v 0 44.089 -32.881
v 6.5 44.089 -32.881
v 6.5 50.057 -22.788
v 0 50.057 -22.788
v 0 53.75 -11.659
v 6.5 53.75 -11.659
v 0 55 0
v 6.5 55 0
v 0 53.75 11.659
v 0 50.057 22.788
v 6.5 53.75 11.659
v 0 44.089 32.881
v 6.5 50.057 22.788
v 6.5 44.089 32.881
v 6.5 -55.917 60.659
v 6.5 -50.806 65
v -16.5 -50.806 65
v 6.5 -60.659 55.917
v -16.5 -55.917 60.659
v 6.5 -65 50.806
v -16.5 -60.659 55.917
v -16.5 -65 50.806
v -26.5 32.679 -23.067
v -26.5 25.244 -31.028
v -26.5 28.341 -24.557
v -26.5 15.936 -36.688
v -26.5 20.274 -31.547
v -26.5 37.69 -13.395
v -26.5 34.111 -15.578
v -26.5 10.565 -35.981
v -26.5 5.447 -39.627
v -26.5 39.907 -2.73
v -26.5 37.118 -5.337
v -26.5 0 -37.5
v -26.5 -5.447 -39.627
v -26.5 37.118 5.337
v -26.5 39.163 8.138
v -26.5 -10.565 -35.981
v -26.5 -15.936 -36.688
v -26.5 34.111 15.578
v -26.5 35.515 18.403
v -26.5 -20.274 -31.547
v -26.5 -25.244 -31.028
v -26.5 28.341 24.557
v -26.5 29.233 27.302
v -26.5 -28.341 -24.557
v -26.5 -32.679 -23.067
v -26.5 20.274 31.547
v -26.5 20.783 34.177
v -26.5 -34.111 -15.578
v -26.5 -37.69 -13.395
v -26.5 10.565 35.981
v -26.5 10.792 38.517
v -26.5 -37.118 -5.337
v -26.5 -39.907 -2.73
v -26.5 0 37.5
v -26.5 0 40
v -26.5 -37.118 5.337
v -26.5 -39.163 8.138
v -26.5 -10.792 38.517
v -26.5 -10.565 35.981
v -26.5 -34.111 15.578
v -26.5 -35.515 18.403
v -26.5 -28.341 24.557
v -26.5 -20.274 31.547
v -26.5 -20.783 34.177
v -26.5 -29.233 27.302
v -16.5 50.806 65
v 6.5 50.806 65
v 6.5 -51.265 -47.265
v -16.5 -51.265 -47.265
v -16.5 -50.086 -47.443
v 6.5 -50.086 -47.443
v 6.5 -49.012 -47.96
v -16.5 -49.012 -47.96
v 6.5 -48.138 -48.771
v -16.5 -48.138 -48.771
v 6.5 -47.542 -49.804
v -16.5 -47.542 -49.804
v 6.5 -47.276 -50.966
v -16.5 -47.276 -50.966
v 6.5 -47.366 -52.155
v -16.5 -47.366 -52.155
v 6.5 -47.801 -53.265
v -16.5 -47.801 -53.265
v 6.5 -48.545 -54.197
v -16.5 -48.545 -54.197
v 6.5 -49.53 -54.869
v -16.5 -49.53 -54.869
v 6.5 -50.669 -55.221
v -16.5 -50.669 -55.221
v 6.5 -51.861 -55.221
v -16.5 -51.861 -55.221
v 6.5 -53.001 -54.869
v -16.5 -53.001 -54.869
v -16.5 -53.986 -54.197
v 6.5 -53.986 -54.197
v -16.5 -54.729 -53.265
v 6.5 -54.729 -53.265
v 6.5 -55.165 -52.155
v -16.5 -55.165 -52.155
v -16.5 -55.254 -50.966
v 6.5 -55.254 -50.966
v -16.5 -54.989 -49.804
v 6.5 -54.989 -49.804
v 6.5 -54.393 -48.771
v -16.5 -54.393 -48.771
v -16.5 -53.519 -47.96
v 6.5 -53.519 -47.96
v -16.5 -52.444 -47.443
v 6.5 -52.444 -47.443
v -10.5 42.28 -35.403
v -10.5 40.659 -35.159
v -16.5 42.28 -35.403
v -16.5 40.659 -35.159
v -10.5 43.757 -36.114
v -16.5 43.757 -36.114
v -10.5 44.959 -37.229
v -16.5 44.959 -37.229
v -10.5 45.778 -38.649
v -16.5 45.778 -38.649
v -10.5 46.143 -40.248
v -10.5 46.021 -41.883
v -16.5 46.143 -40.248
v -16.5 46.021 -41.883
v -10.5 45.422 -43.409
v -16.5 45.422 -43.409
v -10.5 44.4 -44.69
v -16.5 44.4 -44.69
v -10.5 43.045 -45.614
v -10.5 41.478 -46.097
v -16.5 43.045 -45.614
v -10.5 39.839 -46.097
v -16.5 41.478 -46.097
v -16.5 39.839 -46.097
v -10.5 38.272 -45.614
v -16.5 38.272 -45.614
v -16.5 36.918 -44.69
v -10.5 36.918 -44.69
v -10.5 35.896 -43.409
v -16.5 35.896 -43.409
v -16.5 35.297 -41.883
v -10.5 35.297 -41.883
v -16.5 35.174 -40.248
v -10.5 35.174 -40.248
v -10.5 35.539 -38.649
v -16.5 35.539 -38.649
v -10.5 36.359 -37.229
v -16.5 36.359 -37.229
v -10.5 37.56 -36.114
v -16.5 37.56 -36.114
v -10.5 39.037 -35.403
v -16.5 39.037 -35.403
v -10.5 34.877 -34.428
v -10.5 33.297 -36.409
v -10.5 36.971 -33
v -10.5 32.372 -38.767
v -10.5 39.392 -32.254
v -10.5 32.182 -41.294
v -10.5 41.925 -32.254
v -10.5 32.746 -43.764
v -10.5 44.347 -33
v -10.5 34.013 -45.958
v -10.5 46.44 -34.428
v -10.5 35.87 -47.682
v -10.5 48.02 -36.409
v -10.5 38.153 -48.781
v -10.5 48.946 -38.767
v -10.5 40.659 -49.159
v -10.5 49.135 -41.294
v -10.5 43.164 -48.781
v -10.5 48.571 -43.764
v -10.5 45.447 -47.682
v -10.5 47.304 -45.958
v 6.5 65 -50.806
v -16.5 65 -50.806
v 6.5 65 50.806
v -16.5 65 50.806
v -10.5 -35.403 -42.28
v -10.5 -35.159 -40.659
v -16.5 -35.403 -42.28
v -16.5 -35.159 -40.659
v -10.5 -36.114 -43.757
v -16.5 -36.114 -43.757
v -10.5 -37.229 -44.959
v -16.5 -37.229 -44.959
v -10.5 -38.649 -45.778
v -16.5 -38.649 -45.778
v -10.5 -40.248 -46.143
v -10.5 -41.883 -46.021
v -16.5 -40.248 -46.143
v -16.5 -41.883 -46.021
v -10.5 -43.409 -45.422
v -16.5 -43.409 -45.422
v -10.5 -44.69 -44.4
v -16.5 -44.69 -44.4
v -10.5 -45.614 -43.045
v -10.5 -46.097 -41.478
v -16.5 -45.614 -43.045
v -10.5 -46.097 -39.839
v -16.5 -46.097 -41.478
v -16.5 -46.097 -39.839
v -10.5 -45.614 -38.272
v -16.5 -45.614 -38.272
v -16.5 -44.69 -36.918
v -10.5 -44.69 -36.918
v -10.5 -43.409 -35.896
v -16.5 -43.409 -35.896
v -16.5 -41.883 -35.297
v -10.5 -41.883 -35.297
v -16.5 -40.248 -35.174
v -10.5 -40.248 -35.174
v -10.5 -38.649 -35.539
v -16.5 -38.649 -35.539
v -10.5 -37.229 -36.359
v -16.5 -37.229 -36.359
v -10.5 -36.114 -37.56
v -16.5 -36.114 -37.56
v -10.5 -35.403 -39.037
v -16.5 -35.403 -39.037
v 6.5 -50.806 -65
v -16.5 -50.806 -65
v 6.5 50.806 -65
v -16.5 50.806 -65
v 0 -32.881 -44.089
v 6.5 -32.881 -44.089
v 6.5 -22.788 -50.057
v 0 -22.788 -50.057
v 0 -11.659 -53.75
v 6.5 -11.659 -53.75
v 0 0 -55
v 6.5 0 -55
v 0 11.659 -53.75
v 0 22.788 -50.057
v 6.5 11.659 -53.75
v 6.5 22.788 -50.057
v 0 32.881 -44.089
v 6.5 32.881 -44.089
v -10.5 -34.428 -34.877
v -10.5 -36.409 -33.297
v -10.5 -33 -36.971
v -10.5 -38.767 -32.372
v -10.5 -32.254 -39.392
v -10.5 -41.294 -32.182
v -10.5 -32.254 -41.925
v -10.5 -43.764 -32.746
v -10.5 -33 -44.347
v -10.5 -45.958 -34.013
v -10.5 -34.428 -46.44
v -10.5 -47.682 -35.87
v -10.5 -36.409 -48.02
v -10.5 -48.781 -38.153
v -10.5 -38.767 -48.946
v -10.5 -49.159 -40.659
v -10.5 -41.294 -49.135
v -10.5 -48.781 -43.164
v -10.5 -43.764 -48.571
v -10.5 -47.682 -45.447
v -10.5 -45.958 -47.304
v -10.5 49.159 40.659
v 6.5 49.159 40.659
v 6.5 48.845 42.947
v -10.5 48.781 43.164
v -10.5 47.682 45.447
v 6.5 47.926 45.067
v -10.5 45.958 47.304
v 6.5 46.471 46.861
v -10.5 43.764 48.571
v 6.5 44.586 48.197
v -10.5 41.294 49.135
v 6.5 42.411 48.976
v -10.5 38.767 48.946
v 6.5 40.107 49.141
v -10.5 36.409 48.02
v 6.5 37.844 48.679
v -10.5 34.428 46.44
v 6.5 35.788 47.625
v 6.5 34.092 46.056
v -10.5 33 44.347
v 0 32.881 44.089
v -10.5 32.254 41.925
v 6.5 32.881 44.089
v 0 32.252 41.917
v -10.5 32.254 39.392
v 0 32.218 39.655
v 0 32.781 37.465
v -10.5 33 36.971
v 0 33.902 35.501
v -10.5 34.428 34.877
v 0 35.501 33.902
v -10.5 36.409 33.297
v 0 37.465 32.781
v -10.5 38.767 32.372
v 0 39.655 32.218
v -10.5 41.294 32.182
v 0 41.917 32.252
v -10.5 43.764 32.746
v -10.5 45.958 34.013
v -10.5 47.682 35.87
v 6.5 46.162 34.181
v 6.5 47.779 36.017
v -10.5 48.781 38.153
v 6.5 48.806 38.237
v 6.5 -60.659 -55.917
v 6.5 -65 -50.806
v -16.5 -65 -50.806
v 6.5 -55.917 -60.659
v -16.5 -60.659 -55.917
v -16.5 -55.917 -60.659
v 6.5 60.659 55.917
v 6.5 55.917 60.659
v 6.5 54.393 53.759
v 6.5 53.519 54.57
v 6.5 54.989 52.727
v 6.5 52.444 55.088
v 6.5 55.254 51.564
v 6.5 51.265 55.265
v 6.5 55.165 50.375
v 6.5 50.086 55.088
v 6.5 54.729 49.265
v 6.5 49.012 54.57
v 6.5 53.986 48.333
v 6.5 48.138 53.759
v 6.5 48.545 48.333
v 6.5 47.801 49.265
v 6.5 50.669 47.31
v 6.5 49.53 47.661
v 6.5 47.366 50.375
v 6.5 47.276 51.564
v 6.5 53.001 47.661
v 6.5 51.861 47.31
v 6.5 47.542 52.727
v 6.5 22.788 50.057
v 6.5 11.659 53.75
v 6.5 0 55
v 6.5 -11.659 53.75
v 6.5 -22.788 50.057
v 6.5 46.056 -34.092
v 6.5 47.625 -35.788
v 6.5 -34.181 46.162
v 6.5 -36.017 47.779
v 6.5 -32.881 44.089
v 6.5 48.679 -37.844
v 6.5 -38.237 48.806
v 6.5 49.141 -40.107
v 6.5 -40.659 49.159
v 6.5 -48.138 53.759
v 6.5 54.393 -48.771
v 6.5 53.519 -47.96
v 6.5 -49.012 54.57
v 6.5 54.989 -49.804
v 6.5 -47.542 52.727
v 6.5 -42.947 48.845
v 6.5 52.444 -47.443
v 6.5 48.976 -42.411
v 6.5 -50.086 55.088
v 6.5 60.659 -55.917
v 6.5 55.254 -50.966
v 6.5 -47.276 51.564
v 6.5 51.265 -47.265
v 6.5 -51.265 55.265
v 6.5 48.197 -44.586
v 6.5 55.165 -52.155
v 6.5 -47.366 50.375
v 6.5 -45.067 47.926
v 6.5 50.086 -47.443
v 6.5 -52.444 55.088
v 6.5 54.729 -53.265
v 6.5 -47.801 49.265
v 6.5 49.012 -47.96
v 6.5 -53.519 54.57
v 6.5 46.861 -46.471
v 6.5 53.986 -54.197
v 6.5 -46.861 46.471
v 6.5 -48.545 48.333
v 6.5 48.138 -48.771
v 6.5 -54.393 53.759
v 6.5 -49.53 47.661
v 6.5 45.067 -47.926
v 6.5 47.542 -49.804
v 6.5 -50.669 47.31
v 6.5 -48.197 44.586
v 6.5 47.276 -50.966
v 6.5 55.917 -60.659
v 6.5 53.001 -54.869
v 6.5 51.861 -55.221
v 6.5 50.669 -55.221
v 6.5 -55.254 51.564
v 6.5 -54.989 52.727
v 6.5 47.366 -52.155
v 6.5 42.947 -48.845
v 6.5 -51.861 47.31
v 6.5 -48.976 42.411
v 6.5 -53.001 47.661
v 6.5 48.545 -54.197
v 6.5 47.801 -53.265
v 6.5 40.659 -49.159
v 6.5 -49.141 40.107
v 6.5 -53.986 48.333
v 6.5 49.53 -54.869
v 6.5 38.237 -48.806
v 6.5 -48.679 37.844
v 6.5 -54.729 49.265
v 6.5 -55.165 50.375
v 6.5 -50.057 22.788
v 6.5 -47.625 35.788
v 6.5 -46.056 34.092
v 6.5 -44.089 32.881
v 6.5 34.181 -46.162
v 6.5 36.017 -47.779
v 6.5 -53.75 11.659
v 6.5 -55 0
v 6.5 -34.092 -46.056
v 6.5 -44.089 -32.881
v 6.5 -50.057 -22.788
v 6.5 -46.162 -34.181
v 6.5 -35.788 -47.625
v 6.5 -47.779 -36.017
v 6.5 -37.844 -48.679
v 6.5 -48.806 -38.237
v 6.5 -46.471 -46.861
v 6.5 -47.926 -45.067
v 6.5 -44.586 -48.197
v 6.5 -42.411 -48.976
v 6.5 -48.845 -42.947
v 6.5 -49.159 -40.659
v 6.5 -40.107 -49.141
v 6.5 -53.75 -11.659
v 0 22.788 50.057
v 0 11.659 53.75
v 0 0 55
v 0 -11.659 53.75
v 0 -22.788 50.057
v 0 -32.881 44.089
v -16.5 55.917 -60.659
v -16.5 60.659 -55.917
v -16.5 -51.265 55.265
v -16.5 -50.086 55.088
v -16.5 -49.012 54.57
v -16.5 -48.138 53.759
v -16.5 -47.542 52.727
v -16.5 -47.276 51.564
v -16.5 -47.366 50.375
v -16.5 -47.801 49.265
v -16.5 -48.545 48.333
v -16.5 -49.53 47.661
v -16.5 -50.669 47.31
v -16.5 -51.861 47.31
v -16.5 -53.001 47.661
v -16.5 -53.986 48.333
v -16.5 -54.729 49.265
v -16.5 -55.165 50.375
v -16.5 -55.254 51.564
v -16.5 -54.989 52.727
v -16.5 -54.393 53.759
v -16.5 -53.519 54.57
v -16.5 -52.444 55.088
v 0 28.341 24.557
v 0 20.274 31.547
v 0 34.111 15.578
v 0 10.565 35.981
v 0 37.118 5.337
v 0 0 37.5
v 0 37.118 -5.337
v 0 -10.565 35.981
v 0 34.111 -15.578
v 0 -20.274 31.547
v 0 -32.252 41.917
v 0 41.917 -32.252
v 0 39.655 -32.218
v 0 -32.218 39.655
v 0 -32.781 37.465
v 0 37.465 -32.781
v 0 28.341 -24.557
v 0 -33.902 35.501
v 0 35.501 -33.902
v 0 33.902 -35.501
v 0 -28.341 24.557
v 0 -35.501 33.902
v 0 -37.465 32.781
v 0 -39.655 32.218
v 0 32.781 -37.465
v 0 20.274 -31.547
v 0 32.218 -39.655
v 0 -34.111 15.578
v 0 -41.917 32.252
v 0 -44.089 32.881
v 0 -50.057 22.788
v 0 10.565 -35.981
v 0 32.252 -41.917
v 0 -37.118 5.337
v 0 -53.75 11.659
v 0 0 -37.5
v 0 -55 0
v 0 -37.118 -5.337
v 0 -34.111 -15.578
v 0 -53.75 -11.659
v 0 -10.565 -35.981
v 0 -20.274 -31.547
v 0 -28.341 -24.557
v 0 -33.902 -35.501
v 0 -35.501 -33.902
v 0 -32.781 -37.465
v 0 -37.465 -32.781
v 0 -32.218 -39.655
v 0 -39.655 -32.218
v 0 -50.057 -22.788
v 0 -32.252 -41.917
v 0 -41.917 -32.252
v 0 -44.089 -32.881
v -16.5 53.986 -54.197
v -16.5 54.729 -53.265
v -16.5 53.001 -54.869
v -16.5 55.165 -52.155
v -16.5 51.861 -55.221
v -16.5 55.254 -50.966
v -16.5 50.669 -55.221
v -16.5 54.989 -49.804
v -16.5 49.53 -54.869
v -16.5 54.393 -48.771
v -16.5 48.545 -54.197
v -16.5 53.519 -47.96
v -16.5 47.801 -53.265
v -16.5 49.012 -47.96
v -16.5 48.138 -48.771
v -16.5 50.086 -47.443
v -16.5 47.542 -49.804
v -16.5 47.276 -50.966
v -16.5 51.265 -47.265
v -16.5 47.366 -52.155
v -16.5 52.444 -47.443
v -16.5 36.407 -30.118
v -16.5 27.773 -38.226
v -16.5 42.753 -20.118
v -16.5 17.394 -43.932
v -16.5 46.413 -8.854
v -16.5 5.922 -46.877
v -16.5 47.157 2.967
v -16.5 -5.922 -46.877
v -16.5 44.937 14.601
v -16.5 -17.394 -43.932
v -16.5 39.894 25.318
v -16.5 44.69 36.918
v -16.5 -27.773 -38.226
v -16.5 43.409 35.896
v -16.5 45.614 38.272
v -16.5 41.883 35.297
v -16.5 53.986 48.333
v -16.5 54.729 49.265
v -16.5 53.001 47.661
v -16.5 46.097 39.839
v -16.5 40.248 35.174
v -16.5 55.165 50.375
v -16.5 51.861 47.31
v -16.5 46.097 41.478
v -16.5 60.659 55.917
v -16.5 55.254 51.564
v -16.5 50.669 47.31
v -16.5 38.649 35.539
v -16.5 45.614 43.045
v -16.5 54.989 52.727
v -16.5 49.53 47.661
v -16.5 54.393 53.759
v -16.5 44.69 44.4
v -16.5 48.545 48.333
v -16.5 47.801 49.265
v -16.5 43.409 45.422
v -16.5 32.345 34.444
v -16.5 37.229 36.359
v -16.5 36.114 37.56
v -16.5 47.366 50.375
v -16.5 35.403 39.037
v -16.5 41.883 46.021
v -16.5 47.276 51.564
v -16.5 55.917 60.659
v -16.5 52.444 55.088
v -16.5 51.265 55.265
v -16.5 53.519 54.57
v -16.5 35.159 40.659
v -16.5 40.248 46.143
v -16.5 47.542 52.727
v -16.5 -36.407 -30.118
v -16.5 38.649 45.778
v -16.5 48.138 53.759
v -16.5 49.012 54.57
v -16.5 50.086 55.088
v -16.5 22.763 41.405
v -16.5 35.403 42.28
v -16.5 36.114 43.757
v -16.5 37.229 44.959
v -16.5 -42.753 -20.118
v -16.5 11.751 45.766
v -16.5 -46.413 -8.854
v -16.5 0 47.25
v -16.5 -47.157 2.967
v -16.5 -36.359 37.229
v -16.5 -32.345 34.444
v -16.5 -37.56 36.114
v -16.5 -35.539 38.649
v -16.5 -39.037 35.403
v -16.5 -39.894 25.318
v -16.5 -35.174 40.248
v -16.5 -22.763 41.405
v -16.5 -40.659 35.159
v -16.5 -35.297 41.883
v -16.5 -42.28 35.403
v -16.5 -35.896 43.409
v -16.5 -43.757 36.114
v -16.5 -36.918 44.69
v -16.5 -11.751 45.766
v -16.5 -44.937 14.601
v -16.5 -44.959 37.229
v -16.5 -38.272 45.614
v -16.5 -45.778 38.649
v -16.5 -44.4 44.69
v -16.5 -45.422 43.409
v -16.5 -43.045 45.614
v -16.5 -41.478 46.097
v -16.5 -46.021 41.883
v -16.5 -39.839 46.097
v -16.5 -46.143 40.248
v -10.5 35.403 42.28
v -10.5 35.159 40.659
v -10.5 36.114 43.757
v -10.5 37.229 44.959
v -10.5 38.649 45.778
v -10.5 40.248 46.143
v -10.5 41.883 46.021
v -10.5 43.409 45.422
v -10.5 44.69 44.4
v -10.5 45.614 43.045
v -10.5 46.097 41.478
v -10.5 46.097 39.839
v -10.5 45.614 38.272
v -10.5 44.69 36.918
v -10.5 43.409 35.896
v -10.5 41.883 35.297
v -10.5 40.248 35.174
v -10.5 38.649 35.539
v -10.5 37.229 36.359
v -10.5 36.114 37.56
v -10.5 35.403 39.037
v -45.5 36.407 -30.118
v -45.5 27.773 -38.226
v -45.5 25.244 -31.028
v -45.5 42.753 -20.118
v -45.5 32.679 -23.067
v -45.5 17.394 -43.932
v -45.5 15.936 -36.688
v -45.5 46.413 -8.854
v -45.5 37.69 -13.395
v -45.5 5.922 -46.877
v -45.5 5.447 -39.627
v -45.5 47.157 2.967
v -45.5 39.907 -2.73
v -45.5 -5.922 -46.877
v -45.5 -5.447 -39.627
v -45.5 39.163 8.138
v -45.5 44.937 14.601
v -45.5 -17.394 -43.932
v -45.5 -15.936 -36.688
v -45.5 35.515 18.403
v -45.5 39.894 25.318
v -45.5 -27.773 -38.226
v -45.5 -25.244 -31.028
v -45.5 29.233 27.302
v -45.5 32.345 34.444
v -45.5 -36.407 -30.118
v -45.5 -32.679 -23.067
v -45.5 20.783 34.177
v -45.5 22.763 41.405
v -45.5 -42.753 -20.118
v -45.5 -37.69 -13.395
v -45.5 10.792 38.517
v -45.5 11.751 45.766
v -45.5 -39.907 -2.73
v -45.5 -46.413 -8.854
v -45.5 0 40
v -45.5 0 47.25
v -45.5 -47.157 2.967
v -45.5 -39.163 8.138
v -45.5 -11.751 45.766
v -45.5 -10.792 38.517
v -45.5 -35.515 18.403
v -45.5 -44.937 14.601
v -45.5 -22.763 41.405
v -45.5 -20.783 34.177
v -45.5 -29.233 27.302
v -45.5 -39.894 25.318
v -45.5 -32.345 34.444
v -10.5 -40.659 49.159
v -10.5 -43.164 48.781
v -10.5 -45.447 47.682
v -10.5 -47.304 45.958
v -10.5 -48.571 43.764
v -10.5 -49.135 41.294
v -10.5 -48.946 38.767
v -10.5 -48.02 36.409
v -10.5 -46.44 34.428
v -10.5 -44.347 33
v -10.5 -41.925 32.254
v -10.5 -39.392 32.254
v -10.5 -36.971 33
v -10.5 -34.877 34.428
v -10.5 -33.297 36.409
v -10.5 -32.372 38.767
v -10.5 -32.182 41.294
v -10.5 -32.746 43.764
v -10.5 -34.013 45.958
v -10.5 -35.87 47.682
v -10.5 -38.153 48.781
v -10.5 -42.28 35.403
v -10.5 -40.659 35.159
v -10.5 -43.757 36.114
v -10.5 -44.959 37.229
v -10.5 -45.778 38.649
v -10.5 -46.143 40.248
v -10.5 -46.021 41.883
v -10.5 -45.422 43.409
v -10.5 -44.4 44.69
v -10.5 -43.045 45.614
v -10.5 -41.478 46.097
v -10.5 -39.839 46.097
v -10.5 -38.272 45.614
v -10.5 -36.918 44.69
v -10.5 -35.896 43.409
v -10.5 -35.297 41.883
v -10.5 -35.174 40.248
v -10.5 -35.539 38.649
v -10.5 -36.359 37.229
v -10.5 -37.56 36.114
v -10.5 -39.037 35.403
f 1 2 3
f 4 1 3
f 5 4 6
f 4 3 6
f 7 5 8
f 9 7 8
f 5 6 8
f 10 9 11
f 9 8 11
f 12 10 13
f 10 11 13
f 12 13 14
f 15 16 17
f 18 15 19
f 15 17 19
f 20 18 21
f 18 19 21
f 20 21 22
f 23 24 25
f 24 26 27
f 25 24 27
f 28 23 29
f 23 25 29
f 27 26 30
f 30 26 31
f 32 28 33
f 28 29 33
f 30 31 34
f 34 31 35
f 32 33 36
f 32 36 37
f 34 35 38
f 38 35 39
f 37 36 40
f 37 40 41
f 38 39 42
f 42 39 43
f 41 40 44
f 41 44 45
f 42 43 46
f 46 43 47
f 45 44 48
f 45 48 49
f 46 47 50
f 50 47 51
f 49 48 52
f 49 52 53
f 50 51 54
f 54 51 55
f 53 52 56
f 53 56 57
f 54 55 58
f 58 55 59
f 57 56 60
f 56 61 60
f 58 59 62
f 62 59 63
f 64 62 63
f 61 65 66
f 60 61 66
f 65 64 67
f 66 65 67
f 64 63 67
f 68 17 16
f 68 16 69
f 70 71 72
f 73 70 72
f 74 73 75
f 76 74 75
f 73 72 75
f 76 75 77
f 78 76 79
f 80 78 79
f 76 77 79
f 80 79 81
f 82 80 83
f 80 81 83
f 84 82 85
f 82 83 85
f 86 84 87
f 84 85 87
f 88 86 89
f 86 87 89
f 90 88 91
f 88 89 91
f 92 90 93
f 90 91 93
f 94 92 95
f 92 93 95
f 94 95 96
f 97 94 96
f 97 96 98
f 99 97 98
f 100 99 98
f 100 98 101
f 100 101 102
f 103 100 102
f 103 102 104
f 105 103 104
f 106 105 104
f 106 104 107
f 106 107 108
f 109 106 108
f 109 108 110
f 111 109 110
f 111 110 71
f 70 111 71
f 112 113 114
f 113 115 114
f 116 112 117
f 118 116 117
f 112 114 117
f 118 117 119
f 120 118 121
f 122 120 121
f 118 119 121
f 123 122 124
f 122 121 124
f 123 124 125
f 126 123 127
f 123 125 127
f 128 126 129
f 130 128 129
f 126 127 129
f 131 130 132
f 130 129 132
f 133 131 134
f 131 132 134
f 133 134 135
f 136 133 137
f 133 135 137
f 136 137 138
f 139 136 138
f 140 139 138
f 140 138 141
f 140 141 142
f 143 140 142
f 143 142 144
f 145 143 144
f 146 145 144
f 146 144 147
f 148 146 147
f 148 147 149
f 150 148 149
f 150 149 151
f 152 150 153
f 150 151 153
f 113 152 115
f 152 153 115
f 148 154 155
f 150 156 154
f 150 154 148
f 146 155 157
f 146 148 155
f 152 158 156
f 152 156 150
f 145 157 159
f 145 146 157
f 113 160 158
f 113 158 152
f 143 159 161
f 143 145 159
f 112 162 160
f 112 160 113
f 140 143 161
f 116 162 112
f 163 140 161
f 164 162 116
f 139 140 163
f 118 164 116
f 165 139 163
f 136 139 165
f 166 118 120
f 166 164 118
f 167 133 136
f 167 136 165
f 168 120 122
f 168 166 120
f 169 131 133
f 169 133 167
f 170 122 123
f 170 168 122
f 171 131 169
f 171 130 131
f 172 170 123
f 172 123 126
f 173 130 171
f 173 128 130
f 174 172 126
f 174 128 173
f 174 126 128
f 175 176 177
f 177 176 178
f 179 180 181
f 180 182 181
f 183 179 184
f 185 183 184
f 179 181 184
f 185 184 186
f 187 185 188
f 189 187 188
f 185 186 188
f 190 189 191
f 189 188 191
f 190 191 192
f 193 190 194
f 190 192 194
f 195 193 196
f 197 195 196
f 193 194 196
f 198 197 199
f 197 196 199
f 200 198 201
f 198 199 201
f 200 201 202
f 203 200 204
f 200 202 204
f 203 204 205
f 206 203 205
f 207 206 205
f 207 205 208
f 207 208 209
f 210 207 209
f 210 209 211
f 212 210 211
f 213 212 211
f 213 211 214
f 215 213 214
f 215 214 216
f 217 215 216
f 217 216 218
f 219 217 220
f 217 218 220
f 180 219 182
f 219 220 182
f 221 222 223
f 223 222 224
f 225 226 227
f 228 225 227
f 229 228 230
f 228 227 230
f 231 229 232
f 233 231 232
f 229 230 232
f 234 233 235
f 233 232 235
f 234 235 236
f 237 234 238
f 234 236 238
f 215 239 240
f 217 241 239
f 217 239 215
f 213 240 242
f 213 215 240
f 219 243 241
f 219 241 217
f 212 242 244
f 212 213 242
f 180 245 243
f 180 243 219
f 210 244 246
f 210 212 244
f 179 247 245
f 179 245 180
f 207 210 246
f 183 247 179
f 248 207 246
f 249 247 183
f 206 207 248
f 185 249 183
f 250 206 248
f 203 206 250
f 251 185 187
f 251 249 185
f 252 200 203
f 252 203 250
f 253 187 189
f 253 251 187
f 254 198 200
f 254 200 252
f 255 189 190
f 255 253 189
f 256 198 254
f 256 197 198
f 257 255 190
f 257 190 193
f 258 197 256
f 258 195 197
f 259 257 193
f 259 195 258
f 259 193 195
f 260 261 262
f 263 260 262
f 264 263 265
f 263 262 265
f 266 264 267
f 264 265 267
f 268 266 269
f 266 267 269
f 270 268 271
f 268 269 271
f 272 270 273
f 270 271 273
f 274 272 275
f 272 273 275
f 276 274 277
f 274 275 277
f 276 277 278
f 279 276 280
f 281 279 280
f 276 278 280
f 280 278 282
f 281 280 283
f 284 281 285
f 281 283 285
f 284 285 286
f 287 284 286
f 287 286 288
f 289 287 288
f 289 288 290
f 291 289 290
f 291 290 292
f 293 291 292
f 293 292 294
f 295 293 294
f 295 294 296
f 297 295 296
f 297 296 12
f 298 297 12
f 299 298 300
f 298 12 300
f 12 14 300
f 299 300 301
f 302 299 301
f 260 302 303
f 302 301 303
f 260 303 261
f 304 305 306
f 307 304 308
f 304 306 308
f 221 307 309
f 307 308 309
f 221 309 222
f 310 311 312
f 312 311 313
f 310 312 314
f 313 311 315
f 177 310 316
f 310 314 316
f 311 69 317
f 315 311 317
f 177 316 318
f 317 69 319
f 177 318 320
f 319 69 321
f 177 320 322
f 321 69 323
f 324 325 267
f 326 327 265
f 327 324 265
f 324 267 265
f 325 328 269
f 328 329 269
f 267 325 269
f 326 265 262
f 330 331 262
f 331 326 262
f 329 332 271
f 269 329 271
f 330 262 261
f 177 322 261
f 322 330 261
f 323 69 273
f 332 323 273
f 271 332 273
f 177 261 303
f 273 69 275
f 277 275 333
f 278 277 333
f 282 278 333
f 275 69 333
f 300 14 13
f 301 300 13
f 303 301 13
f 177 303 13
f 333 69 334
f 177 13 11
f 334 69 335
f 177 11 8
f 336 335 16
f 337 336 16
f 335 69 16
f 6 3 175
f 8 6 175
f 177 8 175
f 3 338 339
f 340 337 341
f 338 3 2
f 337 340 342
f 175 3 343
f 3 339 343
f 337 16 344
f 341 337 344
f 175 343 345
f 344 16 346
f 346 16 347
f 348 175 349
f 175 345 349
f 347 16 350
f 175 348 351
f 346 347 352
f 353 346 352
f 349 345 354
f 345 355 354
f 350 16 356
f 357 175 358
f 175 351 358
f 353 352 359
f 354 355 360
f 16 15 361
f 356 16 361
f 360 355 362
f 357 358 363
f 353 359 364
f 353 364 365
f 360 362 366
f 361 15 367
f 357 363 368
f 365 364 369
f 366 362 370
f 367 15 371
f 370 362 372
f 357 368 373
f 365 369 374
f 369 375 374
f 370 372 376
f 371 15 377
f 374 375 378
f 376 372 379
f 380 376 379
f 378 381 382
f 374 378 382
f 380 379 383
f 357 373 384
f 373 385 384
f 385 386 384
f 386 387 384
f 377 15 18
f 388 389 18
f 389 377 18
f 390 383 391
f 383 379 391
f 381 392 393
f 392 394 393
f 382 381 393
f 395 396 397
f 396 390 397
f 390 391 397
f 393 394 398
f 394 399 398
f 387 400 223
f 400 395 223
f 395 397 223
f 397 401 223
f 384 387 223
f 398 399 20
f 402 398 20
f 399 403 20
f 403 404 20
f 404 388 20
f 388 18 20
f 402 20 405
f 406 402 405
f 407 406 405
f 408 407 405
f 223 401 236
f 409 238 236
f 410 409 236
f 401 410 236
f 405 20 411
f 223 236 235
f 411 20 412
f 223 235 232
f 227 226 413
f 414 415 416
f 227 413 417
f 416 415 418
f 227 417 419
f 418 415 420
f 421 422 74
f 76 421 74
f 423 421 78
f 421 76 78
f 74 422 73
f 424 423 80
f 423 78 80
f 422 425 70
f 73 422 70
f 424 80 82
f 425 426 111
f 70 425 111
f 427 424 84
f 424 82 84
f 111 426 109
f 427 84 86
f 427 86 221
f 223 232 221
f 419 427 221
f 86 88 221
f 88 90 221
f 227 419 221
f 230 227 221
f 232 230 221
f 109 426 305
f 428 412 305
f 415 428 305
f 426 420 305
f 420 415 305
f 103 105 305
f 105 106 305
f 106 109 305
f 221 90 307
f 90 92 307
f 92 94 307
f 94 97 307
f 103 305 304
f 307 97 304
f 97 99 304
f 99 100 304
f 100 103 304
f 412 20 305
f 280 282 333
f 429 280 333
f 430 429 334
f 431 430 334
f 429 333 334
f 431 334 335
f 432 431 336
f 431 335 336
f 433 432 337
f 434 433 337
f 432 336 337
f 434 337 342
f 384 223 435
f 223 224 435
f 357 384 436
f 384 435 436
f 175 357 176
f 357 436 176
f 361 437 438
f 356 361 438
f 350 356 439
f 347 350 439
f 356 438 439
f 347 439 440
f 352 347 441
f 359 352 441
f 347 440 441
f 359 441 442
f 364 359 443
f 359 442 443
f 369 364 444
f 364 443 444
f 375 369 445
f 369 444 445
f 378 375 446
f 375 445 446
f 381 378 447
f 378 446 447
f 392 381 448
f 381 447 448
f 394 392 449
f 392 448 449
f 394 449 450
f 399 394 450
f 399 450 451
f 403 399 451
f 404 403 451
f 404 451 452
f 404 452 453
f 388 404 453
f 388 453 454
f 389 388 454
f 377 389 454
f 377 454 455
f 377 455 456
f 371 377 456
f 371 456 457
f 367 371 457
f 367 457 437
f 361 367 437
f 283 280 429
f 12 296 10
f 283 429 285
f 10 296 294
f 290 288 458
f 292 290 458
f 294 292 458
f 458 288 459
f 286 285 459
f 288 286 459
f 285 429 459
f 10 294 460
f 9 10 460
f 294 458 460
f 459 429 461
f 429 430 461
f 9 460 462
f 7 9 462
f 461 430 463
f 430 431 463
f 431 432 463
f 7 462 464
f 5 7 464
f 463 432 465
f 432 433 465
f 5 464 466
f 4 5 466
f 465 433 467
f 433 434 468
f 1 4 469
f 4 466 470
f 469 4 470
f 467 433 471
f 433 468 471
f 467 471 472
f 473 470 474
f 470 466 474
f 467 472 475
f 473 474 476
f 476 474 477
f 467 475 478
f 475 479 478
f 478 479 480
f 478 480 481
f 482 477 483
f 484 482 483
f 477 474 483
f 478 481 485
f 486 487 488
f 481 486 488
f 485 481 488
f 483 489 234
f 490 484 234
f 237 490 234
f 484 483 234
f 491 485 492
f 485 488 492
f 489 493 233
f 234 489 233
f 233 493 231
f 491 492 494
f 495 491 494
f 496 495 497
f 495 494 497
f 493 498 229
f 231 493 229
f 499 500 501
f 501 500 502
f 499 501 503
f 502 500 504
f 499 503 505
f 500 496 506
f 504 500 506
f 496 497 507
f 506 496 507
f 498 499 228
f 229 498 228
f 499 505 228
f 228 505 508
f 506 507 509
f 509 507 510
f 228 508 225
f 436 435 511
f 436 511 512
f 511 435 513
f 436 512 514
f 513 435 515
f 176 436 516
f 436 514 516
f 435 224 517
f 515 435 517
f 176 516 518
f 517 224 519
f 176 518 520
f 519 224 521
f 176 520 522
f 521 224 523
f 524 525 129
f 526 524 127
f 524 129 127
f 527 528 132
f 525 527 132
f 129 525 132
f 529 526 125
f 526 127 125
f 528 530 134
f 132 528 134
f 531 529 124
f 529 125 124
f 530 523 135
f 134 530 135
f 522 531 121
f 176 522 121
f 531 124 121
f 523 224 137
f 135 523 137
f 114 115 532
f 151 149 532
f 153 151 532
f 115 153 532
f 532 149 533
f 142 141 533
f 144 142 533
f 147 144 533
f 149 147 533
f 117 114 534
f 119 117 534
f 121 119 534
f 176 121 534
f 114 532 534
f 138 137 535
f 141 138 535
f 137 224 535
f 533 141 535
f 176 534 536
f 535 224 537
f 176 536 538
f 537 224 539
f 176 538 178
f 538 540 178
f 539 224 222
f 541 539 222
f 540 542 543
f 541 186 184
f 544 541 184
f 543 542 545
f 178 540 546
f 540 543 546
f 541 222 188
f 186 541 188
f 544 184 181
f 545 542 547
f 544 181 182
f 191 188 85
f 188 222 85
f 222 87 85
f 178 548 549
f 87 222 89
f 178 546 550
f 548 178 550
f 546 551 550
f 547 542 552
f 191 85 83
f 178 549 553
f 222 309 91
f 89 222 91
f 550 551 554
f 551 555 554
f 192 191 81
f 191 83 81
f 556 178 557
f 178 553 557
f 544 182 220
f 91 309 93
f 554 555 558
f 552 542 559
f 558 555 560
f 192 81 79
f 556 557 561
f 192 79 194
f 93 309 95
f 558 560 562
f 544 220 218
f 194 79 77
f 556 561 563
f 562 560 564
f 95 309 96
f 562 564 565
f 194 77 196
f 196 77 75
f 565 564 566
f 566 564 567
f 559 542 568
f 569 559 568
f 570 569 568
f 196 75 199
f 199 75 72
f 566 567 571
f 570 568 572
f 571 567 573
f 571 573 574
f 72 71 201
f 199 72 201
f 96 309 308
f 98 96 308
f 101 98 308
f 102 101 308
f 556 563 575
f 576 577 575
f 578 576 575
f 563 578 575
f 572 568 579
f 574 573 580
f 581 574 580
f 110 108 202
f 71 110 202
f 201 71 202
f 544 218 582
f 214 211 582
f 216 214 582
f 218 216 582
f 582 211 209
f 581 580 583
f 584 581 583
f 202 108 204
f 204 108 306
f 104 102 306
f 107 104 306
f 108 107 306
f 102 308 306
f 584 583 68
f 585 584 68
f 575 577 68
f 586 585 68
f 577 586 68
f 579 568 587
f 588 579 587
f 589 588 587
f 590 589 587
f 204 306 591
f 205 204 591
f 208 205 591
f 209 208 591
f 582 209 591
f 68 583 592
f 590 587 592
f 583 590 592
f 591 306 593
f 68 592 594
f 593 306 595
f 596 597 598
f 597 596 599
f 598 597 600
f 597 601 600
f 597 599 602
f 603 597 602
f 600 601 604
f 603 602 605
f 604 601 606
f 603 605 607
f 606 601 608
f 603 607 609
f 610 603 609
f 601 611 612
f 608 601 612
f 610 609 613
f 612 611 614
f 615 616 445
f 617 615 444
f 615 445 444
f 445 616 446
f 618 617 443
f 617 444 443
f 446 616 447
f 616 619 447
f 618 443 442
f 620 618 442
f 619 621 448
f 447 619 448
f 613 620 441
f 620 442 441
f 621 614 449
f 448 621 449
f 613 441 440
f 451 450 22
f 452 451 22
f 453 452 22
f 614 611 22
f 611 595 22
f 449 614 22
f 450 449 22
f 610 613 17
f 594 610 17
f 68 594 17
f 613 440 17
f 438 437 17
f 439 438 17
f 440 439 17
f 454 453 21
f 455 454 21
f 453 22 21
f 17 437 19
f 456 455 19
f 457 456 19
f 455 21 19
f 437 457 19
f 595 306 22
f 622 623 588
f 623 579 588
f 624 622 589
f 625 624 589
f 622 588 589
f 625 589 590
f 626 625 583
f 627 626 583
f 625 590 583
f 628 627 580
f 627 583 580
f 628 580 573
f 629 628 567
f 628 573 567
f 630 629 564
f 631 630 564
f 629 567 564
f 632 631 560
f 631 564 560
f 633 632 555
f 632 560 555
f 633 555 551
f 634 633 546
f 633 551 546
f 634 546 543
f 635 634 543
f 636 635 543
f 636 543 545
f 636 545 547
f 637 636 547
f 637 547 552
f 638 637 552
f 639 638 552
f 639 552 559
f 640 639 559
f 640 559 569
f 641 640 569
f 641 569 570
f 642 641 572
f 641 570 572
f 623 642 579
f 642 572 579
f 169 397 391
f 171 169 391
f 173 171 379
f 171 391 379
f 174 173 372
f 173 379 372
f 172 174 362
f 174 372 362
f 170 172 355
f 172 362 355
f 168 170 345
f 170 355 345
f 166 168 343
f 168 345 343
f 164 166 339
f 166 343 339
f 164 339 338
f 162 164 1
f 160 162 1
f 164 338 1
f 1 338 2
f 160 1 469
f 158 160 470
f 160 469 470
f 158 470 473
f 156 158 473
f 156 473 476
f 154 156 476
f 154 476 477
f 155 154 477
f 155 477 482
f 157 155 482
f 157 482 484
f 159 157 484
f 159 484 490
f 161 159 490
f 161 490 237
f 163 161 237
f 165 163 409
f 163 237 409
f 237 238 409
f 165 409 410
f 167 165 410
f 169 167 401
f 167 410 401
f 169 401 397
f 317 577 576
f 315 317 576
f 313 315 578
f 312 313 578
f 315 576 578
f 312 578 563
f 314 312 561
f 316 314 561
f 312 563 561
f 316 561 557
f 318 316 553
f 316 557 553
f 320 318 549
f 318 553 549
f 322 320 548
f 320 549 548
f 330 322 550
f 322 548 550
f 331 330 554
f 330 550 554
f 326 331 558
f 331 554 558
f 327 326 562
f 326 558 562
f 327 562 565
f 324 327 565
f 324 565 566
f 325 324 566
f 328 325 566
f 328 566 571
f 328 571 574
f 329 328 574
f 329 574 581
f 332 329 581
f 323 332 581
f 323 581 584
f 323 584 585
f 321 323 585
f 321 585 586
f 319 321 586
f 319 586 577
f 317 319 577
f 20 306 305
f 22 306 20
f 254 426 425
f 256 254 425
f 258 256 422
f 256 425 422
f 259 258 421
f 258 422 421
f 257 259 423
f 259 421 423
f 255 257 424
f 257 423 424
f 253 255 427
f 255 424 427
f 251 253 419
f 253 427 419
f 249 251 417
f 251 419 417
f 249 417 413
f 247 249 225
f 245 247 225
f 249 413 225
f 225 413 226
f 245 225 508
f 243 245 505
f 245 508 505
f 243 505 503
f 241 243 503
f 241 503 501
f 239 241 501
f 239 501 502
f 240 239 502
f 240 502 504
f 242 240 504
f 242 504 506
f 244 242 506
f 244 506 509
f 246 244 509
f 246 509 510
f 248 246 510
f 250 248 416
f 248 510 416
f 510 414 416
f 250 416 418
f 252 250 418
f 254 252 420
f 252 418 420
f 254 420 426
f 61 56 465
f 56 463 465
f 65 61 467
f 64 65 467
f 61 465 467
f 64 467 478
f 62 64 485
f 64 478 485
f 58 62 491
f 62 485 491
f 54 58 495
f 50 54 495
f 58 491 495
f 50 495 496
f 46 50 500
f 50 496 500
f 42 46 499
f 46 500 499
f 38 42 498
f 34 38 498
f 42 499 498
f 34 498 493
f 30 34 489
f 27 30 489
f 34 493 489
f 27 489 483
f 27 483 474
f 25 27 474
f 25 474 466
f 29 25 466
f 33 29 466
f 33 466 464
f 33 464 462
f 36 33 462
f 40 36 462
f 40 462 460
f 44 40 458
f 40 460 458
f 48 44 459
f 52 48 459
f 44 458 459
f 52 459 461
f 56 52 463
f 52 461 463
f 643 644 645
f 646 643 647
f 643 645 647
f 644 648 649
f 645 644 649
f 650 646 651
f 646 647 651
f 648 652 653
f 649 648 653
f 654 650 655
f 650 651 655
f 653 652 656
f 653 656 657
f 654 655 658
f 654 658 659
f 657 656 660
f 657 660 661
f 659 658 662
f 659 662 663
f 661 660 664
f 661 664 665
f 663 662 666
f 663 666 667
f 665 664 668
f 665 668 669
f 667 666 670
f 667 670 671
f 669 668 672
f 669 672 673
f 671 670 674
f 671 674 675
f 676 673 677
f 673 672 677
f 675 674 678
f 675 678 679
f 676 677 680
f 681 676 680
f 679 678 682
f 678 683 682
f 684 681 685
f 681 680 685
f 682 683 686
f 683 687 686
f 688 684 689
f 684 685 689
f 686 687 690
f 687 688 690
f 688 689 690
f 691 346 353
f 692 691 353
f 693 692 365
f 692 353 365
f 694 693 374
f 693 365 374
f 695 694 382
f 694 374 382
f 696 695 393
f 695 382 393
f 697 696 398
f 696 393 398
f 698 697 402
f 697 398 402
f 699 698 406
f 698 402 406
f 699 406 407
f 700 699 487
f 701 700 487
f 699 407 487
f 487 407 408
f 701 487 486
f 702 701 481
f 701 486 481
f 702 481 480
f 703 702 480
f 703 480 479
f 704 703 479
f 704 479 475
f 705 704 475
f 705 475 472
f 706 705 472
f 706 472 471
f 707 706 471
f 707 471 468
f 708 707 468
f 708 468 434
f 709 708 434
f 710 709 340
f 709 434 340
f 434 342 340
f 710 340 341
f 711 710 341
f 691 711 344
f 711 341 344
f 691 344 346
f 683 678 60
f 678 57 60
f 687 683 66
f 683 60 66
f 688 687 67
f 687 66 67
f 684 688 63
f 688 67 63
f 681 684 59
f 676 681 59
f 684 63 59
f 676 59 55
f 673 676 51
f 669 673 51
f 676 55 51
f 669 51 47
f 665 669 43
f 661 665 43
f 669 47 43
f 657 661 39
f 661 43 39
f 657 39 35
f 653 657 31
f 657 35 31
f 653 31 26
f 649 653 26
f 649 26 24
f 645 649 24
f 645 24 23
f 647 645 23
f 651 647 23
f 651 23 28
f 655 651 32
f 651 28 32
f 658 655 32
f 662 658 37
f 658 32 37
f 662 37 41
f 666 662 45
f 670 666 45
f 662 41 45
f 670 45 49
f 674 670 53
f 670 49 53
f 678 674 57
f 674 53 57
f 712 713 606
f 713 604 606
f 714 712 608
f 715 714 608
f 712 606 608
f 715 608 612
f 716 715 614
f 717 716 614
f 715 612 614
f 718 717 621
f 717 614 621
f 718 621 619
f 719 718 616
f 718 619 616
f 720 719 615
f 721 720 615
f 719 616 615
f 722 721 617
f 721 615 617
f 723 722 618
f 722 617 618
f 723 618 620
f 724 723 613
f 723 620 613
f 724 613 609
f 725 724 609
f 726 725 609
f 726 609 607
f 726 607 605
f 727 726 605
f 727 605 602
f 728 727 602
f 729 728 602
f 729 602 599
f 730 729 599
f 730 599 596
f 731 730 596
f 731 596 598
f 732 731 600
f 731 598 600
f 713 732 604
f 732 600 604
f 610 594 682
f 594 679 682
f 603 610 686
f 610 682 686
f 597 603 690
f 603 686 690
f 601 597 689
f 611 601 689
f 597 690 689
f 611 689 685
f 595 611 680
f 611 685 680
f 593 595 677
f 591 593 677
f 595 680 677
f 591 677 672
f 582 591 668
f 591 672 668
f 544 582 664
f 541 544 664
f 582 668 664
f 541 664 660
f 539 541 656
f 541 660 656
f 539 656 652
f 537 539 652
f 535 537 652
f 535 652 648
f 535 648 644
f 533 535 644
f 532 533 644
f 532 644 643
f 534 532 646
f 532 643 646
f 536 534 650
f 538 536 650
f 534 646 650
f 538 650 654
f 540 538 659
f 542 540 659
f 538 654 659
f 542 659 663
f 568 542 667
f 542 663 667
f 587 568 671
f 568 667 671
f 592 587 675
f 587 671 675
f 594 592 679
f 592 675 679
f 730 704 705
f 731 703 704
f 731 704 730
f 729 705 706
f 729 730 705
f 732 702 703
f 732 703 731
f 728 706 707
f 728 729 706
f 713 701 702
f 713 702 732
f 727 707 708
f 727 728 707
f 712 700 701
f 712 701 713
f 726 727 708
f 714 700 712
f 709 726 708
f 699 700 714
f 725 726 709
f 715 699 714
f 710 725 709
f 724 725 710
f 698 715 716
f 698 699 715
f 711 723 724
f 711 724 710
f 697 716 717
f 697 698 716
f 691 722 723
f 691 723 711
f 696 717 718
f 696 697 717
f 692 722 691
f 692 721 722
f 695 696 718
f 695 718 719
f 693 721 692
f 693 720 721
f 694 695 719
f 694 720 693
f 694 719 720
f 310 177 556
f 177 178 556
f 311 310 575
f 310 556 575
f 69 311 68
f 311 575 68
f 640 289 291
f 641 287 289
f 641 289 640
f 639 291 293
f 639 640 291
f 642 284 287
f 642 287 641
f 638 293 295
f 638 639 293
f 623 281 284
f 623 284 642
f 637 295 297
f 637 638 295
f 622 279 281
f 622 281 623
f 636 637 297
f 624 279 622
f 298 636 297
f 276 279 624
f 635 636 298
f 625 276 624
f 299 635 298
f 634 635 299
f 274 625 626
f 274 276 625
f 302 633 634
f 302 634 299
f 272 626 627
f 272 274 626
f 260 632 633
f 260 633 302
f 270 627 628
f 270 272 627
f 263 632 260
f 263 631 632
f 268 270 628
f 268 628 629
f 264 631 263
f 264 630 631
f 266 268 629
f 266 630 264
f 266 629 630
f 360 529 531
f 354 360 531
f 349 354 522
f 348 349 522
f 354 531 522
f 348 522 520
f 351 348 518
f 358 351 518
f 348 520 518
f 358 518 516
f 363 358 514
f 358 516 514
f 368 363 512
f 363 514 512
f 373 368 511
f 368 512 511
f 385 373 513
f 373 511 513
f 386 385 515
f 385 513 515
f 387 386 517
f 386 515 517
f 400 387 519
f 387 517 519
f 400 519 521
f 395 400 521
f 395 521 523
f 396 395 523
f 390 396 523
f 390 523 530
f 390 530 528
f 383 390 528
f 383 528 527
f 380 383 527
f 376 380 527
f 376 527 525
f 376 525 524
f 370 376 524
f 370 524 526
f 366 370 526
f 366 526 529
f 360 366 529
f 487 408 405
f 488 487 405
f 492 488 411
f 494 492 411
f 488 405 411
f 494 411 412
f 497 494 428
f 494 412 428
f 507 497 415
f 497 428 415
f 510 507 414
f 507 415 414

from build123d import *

# Parameters (mm, degrees)
SKETCH_3_OUTSIDE_W           = 214.814
SKETCH_3_OUTSIDE_H           = 214.814
SKETCH_3_OUTSIDE_W_2         = 130
SKETCH_3_OUTSIDE_H_2         = 130
CUT_EXTRUDE_1_DEPTH          = 121.222710001
SKETCH_4_R                   = 4
CUT_EXTRUDE_2_DEPTH          = 106.61249926
HOLE_WIZARD_M6_1_D           = 11
HOLE_WIZARD_M6_1_CBORE_D     = 17
HOLE_WIZARD_M6_1_CBORE_DEPTH = 17
PATTERN_CIRCULAR_1_COUNT     = 4


with BuildPart() as part:
    # 草图2 → 旋转1 (revolve)
    with BuildSketch(Plane.XY, mode=Mode.PRIVATE) as revolve_1_sk:
        Polygon((0, 37.5), (0, 55), (6.5, 55), (6.5, 82.5), (-16.5, 82.5), (-16.5, 47.25), (-45.5, 47.25), (-45.5, 40), (-26.5, 40), (-26.5, 37.5), align=None)
    revolve(revolve_1_sk.sketch.rotate(Axis((0, 0, 0), (1, 0, 0)), 90), axis=Axis((0, 0, 0), (1, 0, 0)))

    # 草图3 outside → 切除-拉伸1 (cut, through all)
    with BuildSketch(Plane.ZY.offset(16.5)):
        Rectangle(SKETCH_3_OUTSIDE_W, SKETCH_3_OUTSIDE_H)
        Rectangle(SKETCH_3_OUTSIDE_W_2, SKETCH_3_OUTSIDE_H_2, mode=Mode.SUBTRACT)
    extrude(amount=-CUT_EXTRUDE_1_DEPTH, mode=Mode.SUBTRACT)

    # 草图4 → 切除-拉伸2 (cut, through all)
    with BuildSketch(Plane.ZY.offset(45.5)):
        with Locations((-51.265241636, 51.265241636)):
            Circle(SKETCH_4_R)
        with Locations((51.265241636, 51.265241636)):
            Circle(SKETCH_4_R)
        with Locations((51.265241636, -51.265241636)):
            Circle(SKETCH_4_R)
        with Locations((-51.265241636, -51.265241636)):
            Circle(SKETCH_4_R)
    extrude(amount=-CUT_EXTRUDE_2_DEPTH, mode=Mode.SUBTRACT)

    # M6 六角头螺栓的柱形沉头孔1 (through all)
    with Locations(Plane(origin=(6.5, 0, 0), x_dir=(0, 0, -1), z_dir=(1, 0, 0))):
        with Locations((40.658639918, 40.658639918)):
            hole_wizard_m6_1 = CounterBoreHole(HOLE_WIZARD_M6_1_D / 2, HOLE_WIZARD_M6_1_CBORE_D / 2, HOLE_WIZARD_M6_1_CBORE_DEPTH)

    # 阵列(圆周)1: M6 六角头螺栓的柱形沉头孔1 ×4 about axis
    pattern_circular_1_axis = Axis((0, 0, 0), (1, 0, 0))
    for i in range(1, PATTERN_CIRCULAR_1_COUNT):
        add(hole_wizard_m6_1.rotate(pattern_circular_1_axis, i * 360 / PATTERN_CIRCULAR_1_COUNT), mode=Mode.SUBTRACT)


solid = part.part
